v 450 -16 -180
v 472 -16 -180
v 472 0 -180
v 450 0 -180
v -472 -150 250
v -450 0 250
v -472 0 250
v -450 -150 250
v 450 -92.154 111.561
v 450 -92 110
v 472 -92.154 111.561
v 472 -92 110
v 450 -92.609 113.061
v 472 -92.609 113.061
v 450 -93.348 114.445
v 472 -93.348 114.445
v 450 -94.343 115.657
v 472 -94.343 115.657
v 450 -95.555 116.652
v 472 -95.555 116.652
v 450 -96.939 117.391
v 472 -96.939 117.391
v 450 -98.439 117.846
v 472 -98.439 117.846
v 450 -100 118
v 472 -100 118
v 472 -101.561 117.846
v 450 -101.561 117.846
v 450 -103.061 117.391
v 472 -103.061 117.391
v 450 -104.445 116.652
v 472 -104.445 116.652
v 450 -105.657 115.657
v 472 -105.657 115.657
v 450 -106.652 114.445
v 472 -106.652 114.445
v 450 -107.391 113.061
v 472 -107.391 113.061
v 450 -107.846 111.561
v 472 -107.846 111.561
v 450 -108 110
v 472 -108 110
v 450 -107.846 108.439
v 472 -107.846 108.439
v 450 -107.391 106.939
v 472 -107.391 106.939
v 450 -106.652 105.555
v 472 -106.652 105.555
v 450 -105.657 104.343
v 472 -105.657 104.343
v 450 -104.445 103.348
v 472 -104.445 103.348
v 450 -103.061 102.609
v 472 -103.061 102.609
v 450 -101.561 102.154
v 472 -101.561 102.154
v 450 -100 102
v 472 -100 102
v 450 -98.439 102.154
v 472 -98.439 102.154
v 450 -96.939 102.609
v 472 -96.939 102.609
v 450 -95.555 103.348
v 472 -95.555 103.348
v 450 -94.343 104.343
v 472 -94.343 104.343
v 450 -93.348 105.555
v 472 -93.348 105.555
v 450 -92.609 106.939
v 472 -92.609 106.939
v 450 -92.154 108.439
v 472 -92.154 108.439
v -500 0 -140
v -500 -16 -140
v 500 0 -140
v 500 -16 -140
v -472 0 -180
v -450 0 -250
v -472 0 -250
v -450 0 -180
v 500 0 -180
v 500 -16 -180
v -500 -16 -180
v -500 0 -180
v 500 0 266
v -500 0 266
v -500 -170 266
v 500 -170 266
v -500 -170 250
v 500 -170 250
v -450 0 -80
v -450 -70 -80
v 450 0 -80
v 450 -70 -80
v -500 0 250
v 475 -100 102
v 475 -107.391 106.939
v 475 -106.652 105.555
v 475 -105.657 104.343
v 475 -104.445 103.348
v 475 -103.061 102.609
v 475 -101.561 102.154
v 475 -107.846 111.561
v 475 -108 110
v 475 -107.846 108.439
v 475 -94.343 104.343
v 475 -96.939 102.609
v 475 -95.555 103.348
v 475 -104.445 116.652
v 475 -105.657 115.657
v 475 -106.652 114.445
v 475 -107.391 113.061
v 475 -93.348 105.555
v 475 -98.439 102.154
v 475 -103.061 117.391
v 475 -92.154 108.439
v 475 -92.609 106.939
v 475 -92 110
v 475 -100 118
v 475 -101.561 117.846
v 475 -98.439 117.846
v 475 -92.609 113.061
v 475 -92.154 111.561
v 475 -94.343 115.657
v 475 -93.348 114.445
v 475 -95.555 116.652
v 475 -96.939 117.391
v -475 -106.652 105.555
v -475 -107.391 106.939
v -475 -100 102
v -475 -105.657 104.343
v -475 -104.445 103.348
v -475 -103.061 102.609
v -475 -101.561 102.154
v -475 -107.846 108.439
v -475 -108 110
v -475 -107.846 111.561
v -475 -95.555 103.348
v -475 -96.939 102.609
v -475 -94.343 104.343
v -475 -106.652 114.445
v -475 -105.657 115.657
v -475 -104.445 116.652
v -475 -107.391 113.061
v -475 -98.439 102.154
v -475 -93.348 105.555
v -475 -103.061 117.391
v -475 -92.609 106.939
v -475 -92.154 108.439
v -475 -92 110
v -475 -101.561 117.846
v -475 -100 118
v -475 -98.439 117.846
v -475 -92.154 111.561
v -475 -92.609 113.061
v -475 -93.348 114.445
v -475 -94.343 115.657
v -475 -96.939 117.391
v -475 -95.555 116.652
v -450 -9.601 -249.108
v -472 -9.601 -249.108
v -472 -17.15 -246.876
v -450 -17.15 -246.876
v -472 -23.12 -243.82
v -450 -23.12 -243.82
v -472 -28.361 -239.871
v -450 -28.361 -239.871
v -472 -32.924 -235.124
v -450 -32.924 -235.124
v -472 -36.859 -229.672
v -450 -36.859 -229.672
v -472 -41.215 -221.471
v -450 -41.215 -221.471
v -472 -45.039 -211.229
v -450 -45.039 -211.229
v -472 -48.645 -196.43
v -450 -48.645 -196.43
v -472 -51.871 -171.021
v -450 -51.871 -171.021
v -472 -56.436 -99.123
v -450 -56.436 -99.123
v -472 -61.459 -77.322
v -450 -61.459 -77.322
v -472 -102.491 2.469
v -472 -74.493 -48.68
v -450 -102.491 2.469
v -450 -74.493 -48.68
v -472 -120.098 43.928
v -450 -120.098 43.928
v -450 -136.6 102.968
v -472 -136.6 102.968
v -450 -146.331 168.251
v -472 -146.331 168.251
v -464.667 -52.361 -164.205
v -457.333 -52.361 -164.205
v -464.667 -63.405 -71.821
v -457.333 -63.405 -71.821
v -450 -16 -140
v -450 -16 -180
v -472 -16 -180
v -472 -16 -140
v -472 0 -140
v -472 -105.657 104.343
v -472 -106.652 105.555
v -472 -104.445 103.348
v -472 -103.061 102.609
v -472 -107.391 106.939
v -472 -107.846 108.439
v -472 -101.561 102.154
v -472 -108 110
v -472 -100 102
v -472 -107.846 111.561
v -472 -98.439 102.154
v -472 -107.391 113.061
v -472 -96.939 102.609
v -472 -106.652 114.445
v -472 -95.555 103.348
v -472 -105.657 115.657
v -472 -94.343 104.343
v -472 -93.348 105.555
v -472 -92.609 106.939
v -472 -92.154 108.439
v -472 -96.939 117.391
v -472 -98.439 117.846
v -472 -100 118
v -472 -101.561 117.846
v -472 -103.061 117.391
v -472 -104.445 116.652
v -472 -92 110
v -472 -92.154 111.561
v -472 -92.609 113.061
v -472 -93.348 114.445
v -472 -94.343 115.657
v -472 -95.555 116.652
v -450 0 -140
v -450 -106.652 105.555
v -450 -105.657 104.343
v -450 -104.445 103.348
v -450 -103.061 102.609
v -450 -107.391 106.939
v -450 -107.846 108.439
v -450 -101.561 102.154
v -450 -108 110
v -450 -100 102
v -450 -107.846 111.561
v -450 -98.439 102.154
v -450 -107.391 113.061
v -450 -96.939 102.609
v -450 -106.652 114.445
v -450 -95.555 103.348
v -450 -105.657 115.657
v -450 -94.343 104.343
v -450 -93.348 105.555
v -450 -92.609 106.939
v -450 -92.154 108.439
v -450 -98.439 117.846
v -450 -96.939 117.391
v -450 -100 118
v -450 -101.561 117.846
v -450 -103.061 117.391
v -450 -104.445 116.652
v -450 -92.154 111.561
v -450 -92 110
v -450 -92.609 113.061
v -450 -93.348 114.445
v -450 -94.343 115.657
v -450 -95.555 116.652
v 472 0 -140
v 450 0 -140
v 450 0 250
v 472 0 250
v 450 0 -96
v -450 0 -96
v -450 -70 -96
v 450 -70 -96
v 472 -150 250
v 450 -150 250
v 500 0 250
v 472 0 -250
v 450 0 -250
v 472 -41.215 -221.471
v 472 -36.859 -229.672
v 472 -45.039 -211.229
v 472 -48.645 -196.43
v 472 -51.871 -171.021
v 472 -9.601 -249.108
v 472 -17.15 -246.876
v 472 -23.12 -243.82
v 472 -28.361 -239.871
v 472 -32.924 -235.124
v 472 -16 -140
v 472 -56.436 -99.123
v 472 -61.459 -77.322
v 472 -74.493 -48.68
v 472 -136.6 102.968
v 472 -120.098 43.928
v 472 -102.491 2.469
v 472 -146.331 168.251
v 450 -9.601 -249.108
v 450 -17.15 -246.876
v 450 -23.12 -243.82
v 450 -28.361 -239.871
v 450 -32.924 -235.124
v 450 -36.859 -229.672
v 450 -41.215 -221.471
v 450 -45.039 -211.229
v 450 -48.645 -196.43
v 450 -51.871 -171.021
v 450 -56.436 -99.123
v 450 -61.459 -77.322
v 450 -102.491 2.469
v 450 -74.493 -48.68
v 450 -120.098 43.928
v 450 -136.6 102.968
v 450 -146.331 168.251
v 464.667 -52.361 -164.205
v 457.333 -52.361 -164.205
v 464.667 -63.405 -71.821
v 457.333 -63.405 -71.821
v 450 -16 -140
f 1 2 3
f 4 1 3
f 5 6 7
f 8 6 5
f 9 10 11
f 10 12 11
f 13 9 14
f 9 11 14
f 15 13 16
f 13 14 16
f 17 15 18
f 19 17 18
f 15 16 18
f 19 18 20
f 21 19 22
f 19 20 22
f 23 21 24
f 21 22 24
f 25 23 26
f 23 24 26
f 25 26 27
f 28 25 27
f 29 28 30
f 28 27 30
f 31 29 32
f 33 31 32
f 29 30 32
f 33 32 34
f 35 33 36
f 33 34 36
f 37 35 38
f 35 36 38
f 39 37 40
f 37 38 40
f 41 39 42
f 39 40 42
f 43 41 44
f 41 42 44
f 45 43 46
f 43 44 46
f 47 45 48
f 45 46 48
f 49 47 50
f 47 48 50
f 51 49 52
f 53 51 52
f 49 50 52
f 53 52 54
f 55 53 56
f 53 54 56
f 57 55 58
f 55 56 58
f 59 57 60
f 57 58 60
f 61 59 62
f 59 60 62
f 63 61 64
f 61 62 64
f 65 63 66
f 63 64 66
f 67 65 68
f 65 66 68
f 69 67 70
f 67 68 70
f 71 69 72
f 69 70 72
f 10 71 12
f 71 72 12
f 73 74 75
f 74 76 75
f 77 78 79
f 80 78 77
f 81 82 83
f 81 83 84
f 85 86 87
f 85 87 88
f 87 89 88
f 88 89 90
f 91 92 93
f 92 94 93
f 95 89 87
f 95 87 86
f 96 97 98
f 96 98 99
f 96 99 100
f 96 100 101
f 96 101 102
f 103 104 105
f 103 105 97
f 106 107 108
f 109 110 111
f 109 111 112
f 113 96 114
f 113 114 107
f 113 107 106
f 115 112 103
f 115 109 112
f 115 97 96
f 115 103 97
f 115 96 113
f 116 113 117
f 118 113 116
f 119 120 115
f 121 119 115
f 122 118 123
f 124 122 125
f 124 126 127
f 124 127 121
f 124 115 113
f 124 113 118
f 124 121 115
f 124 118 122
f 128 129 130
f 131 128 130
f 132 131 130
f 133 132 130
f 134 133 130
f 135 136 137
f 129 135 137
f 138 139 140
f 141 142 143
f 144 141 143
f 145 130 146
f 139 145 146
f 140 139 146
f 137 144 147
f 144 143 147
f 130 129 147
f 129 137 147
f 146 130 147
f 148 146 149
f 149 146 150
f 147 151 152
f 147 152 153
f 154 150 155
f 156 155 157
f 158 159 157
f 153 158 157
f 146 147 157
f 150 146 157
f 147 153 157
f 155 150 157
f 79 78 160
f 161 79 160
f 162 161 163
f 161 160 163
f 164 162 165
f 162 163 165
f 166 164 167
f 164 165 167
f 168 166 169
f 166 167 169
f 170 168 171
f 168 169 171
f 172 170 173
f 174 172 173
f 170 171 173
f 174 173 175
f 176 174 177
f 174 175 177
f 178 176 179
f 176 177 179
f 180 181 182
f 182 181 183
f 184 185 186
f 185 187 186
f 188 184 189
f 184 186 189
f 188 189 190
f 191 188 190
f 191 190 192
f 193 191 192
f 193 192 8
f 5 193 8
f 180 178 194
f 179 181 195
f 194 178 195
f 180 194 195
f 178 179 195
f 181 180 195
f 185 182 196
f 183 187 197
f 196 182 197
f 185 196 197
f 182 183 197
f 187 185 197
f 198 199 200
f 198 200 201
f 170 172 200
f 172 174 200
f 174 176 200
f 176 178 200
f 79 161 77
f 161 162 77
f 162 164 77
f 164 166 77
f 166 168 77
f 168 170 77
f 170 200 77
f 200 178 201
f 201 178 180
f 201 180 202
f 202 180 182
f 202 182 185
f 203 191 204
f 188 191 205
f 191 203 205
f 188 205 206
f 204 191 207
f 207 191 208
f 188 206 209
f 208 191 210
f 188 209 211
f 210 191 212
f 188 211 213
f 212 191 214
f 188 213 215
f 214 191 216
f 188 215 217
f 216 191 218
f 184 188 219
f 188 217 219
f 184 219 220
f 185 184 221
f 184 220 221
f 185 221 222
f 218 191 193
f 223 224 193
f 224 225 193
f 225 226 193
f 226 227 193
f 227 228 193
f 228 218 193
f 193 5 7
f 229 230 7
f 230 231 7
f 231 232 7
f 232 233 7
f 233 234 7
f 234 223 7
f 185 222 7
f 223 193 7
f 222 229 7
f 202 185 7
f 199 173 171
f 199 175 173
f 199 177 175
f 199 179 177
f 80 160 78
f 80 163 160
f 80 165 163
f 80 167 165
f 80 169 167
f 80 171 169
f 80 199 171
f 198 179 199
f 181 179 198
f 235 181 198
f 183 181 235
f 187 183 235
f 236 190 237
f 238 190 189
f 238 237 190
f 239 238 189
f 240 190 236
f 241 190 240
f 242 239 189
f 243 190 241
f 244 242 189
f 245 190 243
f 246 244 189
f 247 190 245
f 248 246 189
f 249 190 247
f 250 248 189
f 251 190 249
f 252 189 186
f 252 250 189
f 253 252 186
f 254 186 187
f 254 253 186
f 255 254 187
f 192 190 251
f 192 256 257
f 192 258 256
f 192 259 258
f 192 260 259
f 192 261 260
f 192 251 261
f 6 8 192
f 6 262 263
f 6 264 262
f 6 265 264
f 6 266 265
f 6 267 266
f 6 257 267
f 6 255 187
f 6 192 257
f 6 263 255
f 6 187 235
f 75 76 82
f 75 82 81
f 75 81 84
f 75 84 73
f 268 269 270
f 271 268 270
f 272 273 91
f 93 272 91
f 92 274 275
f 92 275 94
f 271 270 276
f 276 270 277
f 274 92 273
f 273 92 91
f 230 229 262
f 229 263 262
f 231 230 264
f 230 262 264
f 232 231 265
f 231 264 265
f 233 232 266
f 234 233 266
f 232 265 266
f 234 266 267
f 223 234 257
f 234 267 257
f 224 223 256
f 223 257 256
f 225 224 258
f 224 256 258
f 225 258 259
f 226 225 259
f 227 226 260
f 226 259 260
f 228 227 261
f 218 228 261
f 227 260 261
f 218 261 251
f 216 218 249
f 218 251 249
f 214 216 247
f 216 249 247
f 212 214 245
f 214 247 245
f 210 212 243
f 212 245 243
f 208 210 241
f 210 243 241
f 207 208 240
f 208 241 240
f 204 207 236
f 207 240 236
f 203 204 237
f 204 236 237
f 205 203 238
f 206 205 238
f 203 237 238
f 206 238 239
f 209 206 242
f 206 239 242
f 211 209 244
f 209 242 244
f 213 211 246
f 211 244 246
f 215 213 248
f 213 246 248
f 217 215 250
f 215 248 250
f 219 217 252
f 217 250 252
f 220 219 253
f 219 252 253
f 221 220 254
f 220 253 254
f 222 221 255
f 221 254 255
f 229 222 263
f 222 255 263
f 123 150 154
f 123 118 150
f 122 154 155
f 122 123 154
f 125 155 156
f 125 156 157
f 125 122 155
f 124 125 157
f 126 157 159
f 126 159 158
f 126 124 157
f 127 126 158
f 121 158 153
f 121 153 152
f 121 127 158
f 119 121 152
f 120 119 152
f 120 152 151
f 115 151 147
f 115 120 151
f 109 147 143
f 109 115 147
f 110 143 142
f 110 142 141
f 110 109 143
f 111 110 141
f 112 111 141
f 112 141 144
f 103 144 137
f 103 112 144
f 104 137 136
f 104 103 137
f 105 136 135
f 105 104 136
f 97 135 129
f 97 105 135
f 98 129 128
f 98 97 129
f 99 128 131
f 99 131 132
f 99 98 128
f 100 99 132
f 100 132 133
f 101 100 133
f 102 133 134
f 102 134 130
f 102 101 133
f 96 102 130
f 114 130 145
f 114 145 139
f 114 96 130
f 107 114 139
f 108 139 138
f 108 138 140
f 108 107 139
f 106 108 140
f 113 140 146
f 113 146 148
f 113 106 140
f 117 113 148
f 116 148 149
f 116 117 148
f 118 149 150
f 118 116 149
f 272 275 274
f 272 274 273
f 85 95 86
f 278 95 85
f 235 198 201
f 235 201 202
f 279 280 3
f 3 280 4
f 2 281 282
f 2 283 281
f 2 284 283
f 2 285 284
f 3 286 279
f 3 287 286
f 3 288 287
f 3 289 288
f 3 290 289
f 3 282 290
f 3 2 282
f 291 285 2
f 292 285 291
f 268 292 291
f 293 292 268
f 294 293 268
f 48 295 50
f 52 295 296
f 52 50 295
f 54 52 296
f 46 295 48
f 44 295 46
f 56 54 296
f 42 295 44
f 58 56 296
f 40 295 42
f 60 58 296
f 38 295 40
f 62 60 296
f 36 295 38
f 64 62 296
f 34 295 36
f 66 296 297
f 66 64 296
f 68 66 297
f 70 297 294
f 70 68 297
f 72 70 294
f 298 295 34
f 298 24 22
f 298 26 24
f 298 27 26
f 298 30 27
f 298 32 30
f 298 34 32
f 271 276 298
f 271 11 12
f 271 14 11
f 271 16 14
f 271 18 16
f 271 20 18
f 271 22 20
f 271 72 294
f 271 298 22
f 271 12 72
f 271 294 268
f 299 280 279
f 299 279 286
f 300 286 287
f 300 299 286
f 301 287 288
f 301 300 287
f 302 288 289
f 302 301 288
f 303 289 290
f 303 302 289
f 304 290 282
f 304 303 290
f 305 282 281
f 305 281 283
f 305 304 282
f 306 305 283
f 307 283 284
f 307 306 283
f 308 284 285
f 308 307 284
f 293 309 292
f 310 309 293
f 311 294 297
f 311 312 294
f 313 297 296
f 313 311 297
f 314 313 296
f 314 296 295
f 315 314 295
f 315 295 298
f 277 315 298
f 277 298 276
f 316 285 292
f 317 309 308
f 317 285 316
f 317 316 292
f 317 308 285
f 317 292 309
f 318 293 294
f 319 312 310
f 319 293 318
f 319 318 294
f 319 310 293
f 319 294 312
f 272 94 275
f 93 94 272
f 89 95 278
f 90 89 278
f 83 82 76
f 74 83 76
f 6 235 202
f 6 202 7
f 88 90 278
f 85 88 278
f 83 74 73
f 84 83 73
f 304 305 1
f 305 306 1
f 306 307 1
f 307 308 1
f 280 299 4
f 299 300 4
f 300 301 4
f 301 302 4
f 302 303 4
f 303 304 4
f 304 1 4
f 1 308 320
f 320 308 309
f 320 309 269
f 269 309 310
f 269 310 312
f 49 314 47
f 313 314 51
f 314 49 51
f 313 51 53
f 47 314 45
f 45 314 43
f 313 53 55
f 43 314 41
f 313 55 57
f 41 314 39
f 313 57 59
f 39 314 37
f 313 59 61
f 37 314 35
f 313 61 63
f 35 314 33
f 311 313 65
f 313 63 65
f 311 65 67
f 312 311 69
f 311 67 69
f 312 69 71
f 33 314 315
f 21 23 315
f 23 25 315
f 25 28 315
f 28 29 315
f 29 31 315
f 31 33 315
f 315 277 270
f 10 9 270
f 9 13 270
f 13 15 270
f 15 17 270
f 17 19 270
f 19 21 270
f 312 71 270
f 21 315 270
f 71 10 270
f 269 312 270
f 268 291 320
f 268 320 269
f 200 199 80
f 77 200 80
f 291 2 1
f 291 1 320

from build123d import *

# Parameters (mm, degrees)
F2_DEPTH      = 22
F4_W          = 1000
F4_H          = 170
F5_DEPTH      = 16
F6_W          = 16
F6_H          = 40
F7_DEPTH      = 500
F8_W          = 70
F8_H          = 16
F9_DEPTH      = 450
F9_DEPTH_BACK = 450
F10_R         = 8
F11_DEPTH     = 475


with BuildPart() as f2:
    # F1 (on offset) → F2 (new body)
    with BuildSketch(Plane.YZ.offset(450)):
        with BuildLine():
            Line((0, 250), (-150, 250))
            add(Edge.make_bspline(
                [(0, -250), (-42.6634041414, -250), (-56.8733196458, -156.3379538907), (-48.7424540116, -47.5698715554), (-150, 36.130781062), (-150, 250)],
                knots=[0, 0, 0, 0, 0.2643376673, 0.5186636217, 1, 1, 1, 1], degree=3))
            Line((0, -250), (0, 250))
        make_face()
    extrude(amount=F2_DEPTH)


with BuildPart() as f3_1:
    # F3: instance of F2
    add(f2.part.mirror(Plane.YZ))


with BuildPart() as f5:
    # F4 (on face) → F5 (new body)
    with BuildSketch(Plane.XY.offset(250)):
        with Locations((0, -85)):
            Rectangle(F4_W, F4_H)
    extrude(amount=F5_DEPTH)


with BuildPart() as f7:
    # F6 (on Right) → F7 (new body, symmetric)
    with BuildSketch(Plane.YZ):
        with Locations((-8, -160)):
            Rectangle(F6_W, F6_H)
    extrude(amount=F7_DEPTH, both=True)


with BuildPart() as f9:
    # F8 (on Right) → F9 (new body, two sides)
    with BuildSketch(Plane.YZ) as f9_sk:
        with Locations((-35, -88)):
            Rectangle(F8_W, F8_H)
    extrude(amount=F9_DEPTH)
    extrude(f9_sk.sketch, amount=-F9_DEPTH_BACK)


with BuildPart() as f11:
    # F10 (on Right) → F11 (new body, symmetric)
    with BuildSketch(Plane.YZ):
        with Locations((-100, 110)):
            Circle(F10_R)
    extrude(amount=F11_DEPTH, both=True)


with BuildPart() as f3_1_1:
    add(f3_1.part)

    # F12: cut F7
    add(f7.part, mode=Mode.SUBTRACT)

    # F13: cut F11
    add(f11.part, mode=Mode.SUBTRACT)


with BuildPart() as f2_1:
    add(f2.part)

    # F12: cut F7
    add(f7.part, mode=Mode.SUBTRACT)

    # F13: cut F11
    add(f11.part, mode=Mode.SUBTRACT)


solid = Compound([f5.part, f7.part, f9.part, f11.part, f3_1_1.part, f2_1.part])
